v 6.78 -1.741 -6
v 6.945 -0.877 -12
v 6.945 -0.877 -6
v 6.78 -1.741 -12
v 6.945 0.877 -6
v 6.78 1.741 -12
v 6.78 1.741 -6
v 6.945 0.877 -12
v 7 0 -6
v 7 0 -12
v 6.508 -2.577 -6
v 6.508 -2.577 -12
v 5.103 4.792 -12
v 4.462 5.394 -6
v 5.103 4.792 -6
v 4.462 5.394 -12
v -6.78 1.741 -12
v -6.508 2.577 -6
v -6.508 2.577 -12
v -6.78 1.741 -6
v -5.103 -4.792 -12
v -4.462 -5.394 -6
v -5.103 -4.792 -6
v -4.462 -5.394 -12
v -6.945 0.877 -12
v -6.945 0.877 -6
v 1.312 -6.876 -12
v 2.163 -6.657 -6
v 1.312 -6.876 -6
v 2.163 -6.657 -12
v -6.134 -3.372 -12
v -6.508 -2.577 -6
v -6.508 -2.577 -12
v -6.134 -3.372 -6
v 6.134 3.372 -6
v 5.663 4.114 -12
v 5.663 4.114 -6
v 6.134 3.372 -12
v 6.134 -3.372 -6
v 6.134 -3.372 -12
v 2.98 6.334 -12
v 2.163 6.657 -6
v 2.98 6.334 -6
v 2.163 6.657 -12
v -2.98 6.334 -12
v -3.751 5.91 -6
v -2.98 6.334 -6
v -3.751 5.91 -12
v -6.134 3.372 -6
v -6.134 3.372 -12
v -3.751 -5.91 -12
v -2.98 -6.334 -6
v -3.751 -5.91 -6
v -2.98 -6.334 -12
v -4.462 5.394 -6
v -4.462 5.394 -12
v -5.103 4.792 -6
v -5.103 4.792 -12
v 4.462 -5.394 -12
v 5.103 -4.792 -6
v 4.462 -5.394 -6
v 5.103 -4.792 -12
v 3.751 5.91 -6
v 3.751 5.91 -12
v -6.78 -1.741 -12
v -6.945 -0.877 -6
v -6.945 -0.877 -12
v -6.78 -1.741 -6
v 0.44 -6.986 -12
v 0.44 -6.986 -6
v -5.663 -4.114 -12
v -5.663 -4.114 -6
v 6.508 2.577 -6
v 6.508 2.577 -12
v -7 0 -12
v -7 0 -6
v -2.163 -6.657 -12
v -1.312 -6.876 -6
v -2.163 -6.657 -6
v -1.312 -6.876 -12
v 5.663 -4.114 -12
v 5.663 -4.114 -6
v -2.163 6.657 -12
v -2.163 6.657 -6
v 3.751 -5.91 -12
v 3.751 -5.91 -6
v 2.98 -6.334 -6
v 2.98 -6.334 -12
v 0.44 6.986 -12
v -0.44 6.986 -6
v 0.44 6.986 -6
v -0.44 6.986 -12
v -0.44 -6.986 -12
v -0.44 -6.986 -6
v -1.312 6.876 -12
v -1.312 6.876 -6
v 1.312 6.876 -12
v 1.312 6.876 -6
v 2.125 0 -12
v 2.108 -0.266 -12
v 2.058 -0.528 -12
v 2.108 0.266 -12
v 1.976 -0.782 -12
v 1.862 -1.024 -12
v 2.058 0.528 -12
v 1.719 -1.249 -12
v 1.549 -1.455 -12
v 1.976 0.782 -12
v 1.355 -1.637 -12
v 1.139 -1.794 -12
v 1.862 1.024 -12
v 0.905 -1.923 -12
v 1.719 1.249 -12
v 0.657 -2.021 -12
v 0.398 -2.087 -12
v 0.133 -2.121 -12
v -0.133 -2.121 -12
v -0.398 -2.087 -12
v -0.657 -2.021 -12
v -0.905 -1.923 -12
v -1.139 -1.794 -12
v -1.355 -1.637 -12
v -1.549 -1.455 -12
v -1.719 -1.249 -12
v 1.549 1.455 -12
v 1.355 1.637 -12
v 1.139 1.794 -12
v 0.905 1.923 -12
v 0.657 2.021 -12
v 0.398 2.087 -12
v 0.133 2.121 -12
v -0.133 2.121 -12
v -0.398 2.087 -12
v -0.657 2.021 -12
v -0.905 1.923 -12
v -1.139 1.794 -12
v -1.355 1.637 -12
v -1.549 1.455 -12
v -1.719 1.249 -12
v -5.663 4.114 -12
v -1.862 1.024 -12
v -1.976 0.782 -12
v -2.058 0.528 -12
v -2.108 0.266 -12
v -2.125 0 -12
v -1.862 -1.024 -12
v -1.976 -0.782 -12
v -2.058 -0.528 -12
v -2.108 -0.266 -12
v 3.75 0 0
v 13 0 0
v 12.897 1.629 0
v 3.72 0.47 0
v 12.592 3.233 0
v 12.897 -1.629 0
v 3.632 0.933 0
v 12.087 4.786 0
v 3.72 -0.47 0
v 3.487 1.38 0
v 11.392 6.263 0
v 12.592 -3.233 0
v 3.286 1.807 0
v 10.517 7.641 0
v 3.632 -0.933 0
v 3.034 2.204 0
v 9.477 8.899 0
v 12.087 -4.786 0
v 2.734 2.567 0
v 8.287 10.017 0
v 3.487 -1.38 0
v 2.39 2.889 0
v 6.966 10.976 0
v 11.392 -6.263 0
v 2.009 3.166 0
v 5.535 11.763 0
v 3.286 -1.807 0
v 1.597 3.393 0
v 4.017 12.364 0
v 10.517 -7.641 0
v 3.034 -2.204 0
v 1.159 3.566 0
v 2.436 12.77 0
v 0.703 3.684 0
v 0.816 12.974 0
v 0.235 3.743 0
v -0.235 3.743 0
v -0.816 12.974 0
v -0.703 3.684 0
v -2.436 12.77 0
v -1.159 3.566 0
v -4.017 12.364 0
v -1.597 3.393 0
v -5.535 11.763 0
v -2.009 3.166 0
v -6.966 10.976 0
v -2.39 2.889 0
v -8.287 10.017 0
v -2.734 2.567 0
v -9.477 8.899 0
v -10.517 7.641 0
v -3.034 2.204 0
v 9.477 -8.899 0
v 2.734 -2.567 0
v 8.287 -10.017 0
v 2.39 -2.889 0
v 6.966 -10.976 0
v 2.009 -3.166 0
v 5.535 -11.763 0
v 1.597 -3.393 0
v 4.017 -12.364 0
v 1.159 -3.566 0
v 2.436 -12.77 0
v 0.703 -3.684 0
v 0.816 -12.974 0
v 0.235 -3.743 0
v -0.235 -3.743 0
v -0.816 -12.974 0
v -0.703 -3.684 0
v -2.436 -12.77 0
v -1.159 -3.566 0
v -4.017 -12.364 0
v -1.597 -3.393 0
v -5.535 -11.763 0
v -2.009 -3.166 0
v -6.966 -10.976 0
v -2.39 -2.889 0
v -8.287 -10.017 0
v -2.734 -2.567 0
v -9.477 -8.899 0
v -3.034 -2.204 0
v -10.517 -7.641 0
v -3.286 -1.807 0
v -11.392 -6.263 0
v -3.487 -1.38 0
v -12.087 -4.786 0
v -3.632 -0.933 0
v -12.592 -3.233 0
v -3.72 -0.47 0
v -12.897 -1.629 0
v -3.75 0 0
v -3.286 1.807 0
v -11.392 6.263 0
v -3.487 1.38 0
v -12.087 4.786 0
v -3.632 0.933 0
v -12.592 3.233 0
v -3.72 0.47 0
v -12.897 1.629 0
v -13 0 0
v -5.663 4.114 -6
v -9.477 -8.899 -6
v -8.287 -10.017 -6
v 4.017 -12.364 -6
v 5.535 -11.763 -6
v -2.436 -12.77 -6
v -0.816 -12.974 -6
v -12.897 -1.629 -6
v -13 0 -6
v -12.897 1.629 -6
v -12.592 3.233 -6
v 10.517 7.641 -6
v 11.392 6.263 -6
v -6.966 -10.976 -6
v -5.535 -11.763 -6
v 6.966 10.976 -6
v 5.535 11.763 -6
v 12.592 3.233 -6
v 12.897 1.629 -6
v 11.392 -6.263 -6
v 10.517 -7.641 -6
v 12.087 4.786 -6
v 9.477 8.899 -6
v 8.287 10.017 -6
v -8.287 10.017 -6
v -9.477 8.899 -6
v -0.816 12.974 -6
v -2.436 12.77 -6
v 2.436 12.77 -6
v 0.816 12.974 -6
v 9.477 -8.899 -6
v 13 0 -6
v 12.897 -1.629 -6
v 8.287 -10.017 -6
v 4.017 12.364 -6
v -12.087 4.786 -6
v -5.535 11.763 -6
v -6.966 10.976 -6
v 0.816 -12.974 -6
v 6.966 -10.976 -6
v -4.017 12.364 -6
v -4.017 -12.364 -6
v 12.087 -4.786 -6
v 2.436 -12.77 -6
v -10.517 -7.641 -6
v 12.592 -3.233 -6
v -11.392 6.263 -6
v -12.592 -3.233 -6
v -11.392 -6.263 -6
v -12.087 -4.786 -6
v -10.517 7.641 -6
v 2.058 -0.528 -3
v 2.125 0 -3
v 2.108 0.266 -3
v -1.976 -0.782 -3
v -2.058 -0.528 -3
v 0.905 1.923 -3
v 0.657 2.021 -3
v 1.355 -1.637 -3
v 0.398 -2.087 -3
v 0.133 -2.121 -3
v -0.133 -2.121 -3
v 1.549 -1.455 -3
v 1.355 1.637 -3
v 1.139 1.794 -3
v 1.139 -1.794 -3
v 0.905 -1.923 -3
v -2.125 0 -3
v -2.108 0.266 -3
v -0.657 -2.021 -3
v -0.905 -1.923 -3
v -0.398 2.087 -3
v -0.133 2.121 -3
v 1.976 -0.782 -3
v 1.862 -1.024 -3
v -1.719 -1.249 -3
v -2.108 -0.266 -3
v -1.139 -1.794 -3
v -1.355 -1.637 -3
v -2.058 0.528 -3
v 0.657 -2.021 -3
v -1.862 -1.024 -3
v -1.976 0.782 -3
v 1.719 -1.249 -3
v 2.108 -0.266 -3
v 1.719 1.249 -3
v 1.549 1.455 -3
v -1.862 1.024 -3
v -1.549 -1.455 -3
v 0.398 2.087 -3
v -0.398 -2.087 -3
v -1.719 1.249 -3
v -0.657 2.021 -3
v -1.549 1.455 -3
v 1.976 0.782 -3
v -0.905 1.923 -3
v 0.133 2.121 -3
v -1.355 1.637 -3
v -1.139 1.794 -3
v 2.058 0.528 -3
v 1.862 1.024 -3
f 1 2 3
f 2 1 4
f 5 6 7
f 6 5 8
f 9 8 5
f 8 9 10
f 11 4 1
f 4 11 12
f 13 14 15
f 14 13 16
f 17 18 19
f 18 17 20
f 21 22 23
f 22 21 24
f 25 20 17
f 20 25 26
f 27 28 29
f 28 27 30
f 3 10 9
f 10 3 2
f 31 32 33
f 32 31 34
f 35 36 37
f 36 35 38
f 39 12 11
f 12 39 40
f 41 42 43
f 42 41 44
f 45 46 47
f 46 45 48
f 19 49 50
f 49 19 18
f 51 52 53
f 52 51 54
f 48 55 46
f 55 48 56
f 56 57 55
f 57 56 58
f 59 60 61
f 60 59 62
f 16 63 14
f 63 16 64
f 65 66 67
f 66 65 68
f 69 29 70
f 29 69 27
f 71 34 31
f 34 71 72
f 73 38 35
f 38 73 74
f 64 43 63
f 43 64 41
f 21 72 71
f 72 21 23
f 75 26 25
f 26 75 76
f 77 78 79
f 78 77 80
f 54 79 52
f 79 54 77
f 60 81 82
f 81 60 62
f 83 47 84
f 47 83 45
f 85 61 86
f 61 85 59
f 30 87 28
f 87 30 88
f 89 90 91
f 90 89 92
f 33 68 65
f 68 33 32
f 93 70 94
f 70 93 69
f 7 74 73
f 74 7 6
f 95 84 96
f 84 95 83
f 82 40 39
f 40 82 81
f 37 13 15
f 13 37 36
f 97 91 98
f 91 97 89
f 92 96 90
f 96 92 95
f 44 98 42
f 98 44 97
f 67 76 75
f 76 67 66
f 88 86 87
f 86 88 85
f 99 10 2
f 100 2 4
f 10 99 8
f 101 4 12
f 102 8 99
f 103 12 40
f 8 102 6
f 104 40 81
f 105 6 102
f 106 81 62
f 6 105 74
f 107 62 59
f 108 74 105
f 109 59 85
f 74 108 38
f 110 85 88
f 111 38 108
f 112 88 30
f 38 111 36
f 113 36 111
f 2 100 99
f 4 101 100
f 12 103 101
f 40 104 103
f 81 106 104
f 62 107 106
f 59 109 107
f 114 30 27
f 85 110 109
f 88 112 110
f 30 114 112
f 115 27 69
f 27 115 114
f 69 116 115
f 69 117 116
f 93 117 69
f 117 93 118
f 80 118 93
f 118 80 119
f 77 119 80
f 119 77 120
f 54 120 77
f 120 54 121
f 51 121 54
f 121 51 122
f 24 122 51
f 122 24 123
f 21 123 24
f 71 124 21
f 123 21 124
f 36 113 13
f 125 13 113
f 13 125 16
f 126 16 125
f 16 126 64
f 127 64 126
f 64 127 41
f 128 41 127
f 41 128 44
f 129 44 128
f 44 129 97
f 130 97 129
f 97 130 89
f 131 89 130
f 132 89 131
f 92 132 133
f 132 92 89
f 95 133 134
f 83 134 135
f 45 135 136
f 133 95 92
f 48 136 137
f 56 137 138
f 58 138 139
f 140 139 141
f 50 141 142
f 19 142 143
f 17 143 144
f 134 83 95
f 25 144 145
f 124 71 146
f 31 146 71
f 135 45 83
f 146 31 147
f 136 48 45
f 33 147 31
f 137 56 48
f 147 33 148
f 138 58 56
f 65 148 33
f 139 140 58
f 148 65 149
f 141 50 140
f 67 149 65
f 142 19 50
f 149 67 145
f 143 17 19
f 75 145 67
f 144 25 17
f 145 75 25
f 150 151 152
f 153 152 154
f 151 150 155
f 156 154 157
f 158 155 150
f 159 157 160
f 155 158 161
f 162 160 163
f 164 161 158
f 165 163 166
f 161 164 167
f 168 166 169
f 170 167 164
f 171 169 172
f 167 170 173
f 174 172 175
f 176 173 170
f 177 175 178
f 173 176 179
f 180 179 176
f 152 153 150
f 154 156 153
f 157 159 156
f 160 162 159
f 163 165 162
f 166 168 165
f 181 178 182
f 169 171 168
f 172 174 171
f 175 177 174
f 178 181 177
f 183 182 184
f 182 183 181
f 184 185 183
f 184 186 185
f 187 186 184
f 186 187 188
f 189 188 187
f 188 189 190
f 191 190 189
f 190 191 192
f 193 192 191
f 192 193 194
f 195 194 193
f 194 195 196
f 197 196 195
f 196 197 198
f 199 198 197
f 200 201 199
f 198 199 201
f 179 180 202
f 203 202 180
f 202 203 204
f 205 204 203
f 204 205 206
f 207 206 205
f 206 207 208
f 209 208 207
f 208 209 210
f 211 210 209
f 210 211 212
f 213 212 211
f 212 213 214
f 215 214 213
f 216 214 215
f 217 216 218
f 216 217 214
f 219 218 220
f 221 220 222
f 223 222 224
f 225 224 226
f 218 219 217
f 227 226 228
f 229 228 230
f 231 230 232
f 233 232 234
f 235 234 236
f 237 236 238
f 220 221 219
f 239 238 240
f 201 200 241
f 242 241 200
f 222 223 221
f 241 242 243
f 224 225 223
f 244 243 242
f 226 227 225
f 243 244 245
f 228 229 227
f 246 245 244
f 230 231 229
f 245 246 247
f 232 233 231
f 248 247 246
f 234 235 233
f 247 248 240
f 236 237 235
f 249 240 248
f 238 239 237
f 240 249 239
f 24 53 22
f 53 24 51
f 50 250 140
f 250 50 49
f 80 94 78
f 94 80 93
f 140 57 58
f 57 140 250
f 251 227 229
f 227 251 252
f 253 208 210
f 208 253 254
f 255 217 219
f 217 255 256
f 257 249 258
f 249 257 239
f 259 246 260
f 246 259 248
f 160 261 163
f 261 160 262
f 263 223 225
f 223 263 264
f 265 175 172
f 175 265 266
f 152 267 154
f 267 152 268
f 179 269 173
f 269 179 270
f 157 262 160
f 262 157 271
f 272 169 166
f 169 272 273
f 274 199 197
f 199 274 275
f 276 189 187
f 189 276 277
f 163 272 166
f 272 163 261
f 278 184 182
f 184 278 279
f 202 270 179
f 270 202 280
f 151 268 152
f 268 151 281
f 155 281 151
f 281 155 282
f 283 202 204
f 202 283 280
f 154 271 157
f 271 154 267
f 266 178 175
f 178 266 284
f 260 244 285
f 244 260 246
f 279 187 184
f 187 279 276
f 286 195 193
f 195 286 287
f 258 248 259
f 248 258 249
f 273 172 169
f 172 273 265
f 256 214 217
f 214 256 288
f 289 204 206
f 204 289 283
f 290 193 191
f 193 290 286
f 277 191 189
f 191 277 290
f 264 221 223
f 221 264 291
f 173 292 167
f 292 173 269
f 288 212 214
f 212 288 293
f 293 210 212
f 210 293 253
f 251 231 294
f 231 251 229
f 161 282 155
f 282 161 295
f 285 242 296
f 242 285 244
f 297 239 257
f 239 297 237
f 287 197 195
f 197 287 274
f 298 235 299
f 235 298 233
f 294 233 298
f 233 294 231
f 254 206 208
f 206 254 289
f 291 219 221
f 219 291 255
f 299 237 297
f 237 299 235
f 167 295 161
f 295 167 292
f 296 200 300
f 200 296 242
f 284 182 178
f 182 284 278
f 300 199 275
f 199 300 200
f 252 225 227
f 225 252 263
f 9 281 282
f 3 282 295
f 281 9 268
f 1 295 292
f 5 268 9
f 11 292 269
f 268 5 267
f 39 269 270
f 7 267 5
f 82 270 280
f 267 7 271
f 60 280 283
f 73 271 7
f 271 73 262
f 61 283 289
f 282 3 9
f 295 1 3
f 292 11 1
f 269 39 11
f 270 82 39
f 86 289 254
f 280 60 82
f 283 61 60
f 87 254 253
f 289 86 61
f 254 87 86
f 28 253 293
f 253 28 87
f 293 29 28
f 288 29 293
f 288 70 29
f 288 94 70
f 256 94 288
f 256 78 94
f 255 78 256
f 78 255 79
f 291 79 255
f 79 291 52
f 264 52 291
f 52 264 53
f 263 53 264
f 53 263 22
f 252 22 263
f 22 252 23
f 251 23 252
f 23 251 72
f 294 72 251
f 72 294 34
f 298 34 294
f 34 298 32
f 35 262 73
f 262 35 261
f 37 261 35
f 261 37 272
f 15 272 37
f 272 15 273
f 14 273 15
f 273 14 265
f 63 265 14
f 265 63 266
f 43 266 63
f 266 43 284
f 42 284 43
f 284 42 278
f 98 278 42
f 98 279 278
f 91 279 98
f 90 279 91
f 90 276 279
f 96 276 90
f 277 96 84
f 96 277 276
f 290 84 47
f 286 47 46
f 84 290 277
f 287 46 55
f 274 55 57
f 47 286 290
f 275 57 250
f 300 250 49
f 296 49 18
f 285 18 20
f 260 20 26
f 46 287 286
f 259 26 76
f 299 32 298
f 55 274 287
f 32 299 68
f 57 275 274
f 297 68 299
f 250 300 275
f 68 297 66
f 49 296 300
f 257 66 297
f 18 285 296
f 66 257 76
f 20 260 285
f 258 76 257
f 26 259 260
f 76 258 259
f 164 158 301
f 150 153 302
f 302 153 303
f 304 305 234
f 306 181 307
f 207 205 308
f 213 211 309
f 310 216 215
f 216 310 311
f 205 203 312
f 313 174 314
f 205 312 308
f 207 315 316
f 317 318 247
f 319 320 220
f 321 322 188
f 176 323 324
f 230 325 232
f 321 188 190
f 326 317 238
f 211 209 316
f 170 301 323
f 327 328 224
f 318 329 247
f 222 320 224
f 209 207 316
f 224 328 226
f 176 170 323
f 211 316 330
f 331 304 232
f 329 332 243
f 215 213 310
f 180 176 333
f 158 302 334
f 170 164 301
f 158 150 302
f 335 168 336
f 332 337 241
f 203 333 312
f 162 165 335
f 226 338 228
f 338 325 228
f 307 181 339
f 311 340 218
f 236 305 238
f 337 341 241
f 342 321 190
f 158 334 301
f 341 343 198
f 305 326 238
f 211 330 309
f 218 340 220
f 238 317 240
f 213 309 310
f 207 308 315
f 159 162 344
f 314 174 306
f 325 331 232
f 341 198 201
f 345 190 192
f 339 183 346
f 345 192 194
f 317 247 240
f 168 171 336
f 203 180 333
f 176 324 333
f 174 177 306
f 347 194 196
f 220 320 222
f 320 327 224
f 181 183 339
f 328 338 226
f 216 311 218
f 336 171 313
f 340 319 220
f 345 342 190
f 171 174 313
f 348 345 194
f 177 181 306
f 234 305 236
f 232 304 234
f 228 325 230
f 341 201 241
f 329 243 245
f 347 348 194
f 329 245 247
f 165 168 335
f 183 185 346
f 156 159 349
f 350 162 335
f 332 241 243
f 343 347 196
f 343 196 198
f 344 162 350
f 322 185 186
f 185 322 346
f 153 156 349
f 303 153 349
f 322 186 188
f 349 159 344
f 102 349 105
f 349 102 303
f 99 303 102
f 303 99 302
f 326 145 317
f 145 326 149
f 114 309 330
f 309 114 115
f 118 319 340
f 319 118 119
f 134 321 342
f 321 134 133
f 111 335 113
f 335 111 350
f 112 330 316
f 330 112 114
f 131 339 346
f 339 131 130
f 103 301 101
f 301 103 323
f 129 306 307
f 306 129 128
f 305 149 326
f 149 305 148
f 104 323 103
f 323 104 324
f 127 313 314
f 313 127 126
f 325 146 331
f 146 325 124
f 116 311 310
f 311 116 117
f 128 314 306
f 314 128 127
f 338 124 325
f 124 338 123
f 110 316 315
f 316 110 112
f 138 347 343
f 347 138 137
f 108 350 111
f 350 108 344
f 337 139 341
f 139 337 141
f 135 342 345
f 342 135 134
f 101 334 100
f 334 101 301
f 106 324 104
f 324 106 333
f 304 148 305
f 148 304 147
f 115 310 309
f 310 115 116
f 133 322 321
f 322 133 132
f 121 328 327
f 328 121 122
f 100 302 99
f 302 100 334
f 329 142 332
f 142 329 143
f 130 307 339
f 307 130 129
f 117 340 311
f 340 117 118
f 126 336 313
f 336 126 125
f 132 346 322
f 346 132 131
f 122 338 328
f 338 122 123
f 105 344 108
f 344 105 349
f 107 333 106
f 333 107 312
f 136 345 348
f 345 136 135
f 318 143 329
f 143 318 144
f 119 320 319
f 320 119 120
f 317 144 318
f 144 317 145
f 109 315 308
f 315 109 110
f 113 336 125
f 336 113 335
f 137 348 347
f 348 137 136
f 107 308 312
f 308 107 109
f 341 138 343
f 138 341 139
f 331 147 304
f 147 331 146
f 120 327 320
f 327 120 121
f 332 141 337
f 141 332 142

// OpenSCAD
$fn = 50;


difference() {
	union() {
		translate(v = [0, 0, -12.0000000000]) {
			cylinder(h = 12, r = 7.0000000000);
		}
		translate(v = [0, 0, -6.0000000000]) {
			cylinder(h = 6, r = 13.0000000000);
		}
	}
	union() {
		translate(v = [0, 0, 0]) {
			rotate(a = [0, 0, 0]) {
				difference() {
					union() {
						#translate(v = [0, 0, -12.0000000000]) {
							cylinder(h = 12, r = 2.0000000000);
						}
						#translate(v = [0, 0, -3]) {
							cylinder(h = 3, r1 = 2.1250000000, r2 = 3.7500000000);
						}
						#translate(v = [0, 0, -12.0000000000]) {
							cylinder(h = 12, r = 2.1250000000);
						}
						#translate(v = [0, 0, -12.0000000000]) {
							cylinder(h = 12, r = 2.0000000000);
						}
					}
					union();
				}
			}
		}
	}
}
